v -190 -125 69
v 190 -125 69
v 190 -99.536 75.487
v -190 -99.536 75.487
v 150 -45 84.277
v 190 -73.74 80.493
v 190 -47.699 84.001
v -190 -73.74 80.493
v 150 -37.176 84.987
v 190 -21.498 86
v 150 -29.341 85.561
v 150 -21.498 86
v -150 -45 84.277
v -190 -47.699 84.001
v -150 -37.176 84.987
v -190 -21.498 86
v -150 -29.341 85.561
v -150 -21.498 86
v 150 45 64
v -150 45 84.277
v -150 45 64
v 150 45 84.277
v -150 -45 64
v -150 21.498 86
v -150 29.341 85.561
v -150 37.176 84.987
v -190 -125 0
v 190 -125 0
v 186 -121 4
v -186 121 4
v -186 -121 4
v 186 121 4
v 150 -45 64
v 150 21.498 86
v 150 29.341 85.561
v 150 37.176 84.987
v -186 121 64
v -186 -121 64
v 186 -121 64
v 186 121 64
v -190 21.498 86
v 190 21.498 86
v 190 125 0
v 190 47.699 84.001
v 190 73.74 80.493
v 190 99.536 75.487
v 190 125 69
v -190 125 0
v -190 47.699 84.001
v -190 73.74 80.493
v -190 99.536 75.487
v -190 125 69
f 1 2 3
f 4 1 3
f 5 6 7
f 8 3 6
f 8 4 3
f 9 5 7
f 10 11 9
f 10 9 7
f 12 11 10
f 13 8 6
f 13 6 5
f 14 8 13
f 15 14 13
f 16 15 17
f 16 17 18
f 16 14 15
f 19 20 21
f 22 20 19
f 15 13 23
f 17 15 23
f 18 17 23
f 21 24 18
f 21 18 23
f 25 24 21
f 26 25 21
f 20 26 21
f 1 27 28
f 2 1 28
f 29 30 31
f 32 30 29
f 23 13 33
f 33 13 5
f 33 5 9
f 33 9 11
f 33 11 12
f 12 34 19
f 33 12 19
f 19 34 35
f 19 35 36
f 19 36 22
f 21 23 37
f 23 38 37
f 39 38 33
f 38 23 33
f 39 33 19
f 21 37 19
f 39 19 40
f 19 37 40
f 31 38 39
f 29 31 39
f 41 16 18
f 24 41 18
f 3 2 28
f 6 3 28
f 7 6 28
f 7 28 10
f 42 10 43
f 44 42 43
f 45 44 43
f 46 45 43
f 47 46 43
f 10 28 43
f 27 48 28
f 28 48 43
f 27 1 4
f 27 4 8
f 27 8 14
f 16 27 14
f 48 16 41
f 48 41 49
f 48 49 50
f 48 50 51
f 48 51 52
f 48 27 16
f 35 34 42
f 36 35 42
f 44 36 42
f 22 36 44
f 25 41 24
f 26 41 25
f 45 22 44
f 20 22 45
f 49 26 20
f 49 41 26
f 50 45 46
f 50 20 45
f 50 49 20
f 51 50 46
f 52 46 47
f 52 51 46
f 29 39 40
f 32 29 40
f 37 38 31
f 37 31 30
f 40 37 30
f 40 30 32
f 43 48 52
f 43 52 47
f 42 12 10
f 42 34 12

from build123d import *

# Parameters (mm, degrees)
CROQUIS1_W              = 380
CROQUIS1_H              = 250
SALIENTE_EXTRUIR1_DEPTH = 64
CROQUIS2_W              = 372
CROQUIS2_H              = 242
CORTAR_EXTRUIR1_DEPTH   = 60
CROQUIS3_W              = 380
CROQUIS3_H              = 250
SALIENTE_EXTRUIR2_DEPTH = 22
CROQUIS5_W              = 300
CROQUIS5_H              = 90
CORTAR_EXTRUIR3_DEPTH   = 41
CORTAR_EXTRUIR2_REACH   = 411.171


with BuildPart() as part:
    # Croquis1 → Saliente-Extruir1 (new body)
    with BuildSketch(Plane.XY):
        Rectangle(CROQUIS1_W, CROQUIS1_H)
    extrude(amount=SALIENTE_EXTRUIR1_DEPTH)

    # Croquis2 → Cortar-Extruir1 (cut)
    with BuildSketch(Plane.XY.offset(64)):
        Rectangle(CROQUIS2_W, CROQUIS2_H)
    extrude(amount=-CORTAR_EXTRUIR1_DEPTH, mode=Mode.SUBTRACT)

    # Croquis3 → Saliente-Extruir2 (add)
    with BuildSketch(Plane.XY.offset(64)):
        Rectangle(CROQUIS3_W, CROQUIS3_H)
    extrude(amount=SALIENTE_EXTRUIR2_DEPTH)

    # Croquis5 → Cortar-Extruir3 (cut)
    with BuildSketch(Plane.XY.offset(86)):
        Rectangle(CROQUIS5_W, CROQUIS5_H)
    extrude(amount=-CORTAR_EXTRUIR3_DEPTH, mode=Mode.SUBTRACT)

    # Cortar-Extruir2: up to this face of the body (flat: up to its plane)
    cortar_extruir2_end = Plane(part.part.faces().sort_by_distance((190, 0, 43))[0])
    # Croquis4 → Cortar-Extruir2 (cut, up to the picked face)
    with BuildSketch(Plane.ZY.offset(190), mode=Mode.PRIVATE) as cortar_extruir2_sk1:
        with BuildLine():
            Line((69, 125), (69, 152.478721162))
            Line((69, 152.478721162), (170.671845975, 152.478721162))
            Line((170.671845975, 152.478721162), (170.671845975, -144.88621918))
            Line((170.671845975, -144.88621918), (69, -144.88621918))
            Line((69, -144.88621918), (69, -125))
            ThreePointArc((69, -125), (86.50817069, 0), (69, 125))
        make_face()
    cortar_extruir2_tool1 = split(extrude(cortar_extruir2_sk1.sketch, amount=-CORTAR_EXTRUIR2_REACH, mode=Mode.PRIVATE), bisect_by=cortar_extruir2_end, keep=Keep.BOTH, mode=Mode.PRIVATE)
    add(cortar_extruir2_tool1.solids().sort_by(Axis((-190, 4.203548, 124.537441), (1, 0, 0)))[0], mode=Mode.SUBTRACT)


solid = part.part
